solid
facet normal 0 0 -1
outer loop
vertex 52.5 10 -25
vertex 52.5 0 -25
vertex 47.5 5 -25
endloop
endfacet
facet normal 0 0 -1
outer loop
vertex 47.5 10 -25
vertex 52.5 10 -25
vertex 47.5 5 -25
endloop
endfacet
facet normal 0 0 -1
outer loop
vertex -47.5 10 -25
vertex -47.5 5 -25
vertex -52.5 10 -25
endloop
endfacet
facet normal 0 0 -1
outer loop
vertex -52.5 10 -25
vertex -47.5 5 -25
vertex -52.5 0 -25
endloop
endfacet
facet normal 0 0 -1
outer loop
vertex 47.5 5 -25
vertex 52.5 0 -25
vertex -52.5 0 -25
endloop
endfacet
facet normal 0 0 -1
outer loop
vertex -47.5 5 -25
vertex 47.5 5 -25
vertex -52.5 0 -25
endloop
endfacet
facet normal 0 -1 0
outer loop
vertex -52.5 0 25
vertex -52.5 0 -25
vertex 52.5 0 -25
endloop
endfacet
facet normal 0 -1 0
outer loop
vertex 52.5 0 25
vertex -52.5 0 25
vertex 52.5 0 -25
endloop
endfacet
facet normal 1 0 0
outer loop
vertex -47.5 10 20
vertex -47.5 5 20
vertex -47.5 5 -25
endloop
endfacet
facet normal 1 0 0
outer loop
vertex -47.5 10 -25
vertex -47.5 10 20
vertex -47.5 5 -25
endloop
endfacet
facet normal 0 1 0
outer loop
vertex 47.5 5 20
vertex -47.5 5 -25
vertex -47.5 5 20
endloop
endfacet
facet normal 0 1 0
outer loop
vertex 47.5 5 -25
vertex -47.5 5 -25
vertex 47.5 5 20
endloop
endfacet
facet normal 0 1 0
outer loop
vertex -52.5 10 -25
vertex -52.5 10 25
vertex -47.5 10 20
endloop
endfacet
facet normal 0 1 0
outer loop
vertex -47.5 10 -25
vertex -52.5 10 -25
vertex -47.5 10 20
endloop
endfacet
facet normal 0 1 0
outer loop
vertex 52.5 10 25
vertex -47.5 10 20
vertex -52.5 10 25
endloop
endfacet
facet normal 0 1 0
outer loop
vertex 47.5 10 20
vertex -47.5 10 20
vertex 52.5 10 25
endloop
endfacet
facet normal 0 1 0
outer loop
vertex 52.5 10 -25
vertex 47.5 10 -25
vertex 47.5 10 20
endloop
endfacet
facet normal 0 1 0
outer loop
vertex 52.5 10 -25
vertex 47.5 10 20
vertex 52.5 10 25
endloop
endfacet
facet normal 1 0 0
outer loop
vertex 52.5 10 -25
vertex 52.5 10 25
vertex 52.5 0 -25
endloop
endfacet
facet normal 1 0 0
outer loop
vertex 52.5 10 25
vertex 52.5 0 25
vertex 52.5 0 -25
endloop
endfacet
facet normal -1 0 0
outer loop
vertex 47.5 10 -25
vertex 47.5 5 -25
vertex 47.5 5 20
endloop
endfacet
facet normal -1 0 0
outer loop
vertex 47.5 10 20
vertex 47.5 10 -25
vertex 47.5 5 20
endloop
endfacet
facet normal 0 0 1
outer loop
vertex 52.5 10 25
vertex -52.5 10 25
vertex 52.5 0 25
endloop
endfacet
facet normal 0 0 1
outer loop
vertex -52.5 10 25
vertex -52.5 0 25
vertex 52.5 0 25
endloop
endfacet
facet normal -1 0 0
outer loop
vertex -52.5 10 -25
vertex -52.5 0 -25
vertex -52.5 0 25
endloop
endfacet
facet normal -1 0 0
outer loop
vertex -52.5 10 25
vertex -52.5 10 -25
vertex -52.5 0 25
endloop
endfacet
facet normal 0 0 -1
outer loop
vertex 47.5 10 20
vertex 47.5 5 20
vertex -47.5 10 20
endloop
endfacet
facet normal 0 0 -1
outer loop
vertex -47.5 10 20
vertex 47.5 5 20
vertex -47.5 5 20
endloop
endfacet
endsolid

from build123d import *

# Parameters (mm, degrees)
SKETCH1_W           = 105
SKETCH1_H           = 50
BOSS_EXTRUDE1_DEPTH = 5
BOSS_EXTRUDE2_DEPTH = 5


with BuildPart() as part:
    # Sketch1 → Boss-Extrude1 (new body)
    with BuildSketch(Plane(origin=(0, 0, 0), x_dir=(1, 0, 0), z_dir=(0, 1, 0))):
        Rectangle(SKETCH1_W, SKETCH1_H)
    extrude(amount=BOSS_EXTRUDE1_DEPTH)

    # Sketch2 → Boss-Extrude2 (add)
    with BuildSketch(Plane(origin=(0, 5, 0), x_dir=(1, 0, 0), z_dir=(0, 1, 0))):
        Polygon((-52.5, 25), (-52.5, -25), (52.5, -25), (52.5, 25), (47.5, 25), (47.5, -20), (-47.5, -20), (-47.5, 25), align=None)
    extrude(amount=BOSS_EXTRUDE2_DEPTH)


solid = part.part
